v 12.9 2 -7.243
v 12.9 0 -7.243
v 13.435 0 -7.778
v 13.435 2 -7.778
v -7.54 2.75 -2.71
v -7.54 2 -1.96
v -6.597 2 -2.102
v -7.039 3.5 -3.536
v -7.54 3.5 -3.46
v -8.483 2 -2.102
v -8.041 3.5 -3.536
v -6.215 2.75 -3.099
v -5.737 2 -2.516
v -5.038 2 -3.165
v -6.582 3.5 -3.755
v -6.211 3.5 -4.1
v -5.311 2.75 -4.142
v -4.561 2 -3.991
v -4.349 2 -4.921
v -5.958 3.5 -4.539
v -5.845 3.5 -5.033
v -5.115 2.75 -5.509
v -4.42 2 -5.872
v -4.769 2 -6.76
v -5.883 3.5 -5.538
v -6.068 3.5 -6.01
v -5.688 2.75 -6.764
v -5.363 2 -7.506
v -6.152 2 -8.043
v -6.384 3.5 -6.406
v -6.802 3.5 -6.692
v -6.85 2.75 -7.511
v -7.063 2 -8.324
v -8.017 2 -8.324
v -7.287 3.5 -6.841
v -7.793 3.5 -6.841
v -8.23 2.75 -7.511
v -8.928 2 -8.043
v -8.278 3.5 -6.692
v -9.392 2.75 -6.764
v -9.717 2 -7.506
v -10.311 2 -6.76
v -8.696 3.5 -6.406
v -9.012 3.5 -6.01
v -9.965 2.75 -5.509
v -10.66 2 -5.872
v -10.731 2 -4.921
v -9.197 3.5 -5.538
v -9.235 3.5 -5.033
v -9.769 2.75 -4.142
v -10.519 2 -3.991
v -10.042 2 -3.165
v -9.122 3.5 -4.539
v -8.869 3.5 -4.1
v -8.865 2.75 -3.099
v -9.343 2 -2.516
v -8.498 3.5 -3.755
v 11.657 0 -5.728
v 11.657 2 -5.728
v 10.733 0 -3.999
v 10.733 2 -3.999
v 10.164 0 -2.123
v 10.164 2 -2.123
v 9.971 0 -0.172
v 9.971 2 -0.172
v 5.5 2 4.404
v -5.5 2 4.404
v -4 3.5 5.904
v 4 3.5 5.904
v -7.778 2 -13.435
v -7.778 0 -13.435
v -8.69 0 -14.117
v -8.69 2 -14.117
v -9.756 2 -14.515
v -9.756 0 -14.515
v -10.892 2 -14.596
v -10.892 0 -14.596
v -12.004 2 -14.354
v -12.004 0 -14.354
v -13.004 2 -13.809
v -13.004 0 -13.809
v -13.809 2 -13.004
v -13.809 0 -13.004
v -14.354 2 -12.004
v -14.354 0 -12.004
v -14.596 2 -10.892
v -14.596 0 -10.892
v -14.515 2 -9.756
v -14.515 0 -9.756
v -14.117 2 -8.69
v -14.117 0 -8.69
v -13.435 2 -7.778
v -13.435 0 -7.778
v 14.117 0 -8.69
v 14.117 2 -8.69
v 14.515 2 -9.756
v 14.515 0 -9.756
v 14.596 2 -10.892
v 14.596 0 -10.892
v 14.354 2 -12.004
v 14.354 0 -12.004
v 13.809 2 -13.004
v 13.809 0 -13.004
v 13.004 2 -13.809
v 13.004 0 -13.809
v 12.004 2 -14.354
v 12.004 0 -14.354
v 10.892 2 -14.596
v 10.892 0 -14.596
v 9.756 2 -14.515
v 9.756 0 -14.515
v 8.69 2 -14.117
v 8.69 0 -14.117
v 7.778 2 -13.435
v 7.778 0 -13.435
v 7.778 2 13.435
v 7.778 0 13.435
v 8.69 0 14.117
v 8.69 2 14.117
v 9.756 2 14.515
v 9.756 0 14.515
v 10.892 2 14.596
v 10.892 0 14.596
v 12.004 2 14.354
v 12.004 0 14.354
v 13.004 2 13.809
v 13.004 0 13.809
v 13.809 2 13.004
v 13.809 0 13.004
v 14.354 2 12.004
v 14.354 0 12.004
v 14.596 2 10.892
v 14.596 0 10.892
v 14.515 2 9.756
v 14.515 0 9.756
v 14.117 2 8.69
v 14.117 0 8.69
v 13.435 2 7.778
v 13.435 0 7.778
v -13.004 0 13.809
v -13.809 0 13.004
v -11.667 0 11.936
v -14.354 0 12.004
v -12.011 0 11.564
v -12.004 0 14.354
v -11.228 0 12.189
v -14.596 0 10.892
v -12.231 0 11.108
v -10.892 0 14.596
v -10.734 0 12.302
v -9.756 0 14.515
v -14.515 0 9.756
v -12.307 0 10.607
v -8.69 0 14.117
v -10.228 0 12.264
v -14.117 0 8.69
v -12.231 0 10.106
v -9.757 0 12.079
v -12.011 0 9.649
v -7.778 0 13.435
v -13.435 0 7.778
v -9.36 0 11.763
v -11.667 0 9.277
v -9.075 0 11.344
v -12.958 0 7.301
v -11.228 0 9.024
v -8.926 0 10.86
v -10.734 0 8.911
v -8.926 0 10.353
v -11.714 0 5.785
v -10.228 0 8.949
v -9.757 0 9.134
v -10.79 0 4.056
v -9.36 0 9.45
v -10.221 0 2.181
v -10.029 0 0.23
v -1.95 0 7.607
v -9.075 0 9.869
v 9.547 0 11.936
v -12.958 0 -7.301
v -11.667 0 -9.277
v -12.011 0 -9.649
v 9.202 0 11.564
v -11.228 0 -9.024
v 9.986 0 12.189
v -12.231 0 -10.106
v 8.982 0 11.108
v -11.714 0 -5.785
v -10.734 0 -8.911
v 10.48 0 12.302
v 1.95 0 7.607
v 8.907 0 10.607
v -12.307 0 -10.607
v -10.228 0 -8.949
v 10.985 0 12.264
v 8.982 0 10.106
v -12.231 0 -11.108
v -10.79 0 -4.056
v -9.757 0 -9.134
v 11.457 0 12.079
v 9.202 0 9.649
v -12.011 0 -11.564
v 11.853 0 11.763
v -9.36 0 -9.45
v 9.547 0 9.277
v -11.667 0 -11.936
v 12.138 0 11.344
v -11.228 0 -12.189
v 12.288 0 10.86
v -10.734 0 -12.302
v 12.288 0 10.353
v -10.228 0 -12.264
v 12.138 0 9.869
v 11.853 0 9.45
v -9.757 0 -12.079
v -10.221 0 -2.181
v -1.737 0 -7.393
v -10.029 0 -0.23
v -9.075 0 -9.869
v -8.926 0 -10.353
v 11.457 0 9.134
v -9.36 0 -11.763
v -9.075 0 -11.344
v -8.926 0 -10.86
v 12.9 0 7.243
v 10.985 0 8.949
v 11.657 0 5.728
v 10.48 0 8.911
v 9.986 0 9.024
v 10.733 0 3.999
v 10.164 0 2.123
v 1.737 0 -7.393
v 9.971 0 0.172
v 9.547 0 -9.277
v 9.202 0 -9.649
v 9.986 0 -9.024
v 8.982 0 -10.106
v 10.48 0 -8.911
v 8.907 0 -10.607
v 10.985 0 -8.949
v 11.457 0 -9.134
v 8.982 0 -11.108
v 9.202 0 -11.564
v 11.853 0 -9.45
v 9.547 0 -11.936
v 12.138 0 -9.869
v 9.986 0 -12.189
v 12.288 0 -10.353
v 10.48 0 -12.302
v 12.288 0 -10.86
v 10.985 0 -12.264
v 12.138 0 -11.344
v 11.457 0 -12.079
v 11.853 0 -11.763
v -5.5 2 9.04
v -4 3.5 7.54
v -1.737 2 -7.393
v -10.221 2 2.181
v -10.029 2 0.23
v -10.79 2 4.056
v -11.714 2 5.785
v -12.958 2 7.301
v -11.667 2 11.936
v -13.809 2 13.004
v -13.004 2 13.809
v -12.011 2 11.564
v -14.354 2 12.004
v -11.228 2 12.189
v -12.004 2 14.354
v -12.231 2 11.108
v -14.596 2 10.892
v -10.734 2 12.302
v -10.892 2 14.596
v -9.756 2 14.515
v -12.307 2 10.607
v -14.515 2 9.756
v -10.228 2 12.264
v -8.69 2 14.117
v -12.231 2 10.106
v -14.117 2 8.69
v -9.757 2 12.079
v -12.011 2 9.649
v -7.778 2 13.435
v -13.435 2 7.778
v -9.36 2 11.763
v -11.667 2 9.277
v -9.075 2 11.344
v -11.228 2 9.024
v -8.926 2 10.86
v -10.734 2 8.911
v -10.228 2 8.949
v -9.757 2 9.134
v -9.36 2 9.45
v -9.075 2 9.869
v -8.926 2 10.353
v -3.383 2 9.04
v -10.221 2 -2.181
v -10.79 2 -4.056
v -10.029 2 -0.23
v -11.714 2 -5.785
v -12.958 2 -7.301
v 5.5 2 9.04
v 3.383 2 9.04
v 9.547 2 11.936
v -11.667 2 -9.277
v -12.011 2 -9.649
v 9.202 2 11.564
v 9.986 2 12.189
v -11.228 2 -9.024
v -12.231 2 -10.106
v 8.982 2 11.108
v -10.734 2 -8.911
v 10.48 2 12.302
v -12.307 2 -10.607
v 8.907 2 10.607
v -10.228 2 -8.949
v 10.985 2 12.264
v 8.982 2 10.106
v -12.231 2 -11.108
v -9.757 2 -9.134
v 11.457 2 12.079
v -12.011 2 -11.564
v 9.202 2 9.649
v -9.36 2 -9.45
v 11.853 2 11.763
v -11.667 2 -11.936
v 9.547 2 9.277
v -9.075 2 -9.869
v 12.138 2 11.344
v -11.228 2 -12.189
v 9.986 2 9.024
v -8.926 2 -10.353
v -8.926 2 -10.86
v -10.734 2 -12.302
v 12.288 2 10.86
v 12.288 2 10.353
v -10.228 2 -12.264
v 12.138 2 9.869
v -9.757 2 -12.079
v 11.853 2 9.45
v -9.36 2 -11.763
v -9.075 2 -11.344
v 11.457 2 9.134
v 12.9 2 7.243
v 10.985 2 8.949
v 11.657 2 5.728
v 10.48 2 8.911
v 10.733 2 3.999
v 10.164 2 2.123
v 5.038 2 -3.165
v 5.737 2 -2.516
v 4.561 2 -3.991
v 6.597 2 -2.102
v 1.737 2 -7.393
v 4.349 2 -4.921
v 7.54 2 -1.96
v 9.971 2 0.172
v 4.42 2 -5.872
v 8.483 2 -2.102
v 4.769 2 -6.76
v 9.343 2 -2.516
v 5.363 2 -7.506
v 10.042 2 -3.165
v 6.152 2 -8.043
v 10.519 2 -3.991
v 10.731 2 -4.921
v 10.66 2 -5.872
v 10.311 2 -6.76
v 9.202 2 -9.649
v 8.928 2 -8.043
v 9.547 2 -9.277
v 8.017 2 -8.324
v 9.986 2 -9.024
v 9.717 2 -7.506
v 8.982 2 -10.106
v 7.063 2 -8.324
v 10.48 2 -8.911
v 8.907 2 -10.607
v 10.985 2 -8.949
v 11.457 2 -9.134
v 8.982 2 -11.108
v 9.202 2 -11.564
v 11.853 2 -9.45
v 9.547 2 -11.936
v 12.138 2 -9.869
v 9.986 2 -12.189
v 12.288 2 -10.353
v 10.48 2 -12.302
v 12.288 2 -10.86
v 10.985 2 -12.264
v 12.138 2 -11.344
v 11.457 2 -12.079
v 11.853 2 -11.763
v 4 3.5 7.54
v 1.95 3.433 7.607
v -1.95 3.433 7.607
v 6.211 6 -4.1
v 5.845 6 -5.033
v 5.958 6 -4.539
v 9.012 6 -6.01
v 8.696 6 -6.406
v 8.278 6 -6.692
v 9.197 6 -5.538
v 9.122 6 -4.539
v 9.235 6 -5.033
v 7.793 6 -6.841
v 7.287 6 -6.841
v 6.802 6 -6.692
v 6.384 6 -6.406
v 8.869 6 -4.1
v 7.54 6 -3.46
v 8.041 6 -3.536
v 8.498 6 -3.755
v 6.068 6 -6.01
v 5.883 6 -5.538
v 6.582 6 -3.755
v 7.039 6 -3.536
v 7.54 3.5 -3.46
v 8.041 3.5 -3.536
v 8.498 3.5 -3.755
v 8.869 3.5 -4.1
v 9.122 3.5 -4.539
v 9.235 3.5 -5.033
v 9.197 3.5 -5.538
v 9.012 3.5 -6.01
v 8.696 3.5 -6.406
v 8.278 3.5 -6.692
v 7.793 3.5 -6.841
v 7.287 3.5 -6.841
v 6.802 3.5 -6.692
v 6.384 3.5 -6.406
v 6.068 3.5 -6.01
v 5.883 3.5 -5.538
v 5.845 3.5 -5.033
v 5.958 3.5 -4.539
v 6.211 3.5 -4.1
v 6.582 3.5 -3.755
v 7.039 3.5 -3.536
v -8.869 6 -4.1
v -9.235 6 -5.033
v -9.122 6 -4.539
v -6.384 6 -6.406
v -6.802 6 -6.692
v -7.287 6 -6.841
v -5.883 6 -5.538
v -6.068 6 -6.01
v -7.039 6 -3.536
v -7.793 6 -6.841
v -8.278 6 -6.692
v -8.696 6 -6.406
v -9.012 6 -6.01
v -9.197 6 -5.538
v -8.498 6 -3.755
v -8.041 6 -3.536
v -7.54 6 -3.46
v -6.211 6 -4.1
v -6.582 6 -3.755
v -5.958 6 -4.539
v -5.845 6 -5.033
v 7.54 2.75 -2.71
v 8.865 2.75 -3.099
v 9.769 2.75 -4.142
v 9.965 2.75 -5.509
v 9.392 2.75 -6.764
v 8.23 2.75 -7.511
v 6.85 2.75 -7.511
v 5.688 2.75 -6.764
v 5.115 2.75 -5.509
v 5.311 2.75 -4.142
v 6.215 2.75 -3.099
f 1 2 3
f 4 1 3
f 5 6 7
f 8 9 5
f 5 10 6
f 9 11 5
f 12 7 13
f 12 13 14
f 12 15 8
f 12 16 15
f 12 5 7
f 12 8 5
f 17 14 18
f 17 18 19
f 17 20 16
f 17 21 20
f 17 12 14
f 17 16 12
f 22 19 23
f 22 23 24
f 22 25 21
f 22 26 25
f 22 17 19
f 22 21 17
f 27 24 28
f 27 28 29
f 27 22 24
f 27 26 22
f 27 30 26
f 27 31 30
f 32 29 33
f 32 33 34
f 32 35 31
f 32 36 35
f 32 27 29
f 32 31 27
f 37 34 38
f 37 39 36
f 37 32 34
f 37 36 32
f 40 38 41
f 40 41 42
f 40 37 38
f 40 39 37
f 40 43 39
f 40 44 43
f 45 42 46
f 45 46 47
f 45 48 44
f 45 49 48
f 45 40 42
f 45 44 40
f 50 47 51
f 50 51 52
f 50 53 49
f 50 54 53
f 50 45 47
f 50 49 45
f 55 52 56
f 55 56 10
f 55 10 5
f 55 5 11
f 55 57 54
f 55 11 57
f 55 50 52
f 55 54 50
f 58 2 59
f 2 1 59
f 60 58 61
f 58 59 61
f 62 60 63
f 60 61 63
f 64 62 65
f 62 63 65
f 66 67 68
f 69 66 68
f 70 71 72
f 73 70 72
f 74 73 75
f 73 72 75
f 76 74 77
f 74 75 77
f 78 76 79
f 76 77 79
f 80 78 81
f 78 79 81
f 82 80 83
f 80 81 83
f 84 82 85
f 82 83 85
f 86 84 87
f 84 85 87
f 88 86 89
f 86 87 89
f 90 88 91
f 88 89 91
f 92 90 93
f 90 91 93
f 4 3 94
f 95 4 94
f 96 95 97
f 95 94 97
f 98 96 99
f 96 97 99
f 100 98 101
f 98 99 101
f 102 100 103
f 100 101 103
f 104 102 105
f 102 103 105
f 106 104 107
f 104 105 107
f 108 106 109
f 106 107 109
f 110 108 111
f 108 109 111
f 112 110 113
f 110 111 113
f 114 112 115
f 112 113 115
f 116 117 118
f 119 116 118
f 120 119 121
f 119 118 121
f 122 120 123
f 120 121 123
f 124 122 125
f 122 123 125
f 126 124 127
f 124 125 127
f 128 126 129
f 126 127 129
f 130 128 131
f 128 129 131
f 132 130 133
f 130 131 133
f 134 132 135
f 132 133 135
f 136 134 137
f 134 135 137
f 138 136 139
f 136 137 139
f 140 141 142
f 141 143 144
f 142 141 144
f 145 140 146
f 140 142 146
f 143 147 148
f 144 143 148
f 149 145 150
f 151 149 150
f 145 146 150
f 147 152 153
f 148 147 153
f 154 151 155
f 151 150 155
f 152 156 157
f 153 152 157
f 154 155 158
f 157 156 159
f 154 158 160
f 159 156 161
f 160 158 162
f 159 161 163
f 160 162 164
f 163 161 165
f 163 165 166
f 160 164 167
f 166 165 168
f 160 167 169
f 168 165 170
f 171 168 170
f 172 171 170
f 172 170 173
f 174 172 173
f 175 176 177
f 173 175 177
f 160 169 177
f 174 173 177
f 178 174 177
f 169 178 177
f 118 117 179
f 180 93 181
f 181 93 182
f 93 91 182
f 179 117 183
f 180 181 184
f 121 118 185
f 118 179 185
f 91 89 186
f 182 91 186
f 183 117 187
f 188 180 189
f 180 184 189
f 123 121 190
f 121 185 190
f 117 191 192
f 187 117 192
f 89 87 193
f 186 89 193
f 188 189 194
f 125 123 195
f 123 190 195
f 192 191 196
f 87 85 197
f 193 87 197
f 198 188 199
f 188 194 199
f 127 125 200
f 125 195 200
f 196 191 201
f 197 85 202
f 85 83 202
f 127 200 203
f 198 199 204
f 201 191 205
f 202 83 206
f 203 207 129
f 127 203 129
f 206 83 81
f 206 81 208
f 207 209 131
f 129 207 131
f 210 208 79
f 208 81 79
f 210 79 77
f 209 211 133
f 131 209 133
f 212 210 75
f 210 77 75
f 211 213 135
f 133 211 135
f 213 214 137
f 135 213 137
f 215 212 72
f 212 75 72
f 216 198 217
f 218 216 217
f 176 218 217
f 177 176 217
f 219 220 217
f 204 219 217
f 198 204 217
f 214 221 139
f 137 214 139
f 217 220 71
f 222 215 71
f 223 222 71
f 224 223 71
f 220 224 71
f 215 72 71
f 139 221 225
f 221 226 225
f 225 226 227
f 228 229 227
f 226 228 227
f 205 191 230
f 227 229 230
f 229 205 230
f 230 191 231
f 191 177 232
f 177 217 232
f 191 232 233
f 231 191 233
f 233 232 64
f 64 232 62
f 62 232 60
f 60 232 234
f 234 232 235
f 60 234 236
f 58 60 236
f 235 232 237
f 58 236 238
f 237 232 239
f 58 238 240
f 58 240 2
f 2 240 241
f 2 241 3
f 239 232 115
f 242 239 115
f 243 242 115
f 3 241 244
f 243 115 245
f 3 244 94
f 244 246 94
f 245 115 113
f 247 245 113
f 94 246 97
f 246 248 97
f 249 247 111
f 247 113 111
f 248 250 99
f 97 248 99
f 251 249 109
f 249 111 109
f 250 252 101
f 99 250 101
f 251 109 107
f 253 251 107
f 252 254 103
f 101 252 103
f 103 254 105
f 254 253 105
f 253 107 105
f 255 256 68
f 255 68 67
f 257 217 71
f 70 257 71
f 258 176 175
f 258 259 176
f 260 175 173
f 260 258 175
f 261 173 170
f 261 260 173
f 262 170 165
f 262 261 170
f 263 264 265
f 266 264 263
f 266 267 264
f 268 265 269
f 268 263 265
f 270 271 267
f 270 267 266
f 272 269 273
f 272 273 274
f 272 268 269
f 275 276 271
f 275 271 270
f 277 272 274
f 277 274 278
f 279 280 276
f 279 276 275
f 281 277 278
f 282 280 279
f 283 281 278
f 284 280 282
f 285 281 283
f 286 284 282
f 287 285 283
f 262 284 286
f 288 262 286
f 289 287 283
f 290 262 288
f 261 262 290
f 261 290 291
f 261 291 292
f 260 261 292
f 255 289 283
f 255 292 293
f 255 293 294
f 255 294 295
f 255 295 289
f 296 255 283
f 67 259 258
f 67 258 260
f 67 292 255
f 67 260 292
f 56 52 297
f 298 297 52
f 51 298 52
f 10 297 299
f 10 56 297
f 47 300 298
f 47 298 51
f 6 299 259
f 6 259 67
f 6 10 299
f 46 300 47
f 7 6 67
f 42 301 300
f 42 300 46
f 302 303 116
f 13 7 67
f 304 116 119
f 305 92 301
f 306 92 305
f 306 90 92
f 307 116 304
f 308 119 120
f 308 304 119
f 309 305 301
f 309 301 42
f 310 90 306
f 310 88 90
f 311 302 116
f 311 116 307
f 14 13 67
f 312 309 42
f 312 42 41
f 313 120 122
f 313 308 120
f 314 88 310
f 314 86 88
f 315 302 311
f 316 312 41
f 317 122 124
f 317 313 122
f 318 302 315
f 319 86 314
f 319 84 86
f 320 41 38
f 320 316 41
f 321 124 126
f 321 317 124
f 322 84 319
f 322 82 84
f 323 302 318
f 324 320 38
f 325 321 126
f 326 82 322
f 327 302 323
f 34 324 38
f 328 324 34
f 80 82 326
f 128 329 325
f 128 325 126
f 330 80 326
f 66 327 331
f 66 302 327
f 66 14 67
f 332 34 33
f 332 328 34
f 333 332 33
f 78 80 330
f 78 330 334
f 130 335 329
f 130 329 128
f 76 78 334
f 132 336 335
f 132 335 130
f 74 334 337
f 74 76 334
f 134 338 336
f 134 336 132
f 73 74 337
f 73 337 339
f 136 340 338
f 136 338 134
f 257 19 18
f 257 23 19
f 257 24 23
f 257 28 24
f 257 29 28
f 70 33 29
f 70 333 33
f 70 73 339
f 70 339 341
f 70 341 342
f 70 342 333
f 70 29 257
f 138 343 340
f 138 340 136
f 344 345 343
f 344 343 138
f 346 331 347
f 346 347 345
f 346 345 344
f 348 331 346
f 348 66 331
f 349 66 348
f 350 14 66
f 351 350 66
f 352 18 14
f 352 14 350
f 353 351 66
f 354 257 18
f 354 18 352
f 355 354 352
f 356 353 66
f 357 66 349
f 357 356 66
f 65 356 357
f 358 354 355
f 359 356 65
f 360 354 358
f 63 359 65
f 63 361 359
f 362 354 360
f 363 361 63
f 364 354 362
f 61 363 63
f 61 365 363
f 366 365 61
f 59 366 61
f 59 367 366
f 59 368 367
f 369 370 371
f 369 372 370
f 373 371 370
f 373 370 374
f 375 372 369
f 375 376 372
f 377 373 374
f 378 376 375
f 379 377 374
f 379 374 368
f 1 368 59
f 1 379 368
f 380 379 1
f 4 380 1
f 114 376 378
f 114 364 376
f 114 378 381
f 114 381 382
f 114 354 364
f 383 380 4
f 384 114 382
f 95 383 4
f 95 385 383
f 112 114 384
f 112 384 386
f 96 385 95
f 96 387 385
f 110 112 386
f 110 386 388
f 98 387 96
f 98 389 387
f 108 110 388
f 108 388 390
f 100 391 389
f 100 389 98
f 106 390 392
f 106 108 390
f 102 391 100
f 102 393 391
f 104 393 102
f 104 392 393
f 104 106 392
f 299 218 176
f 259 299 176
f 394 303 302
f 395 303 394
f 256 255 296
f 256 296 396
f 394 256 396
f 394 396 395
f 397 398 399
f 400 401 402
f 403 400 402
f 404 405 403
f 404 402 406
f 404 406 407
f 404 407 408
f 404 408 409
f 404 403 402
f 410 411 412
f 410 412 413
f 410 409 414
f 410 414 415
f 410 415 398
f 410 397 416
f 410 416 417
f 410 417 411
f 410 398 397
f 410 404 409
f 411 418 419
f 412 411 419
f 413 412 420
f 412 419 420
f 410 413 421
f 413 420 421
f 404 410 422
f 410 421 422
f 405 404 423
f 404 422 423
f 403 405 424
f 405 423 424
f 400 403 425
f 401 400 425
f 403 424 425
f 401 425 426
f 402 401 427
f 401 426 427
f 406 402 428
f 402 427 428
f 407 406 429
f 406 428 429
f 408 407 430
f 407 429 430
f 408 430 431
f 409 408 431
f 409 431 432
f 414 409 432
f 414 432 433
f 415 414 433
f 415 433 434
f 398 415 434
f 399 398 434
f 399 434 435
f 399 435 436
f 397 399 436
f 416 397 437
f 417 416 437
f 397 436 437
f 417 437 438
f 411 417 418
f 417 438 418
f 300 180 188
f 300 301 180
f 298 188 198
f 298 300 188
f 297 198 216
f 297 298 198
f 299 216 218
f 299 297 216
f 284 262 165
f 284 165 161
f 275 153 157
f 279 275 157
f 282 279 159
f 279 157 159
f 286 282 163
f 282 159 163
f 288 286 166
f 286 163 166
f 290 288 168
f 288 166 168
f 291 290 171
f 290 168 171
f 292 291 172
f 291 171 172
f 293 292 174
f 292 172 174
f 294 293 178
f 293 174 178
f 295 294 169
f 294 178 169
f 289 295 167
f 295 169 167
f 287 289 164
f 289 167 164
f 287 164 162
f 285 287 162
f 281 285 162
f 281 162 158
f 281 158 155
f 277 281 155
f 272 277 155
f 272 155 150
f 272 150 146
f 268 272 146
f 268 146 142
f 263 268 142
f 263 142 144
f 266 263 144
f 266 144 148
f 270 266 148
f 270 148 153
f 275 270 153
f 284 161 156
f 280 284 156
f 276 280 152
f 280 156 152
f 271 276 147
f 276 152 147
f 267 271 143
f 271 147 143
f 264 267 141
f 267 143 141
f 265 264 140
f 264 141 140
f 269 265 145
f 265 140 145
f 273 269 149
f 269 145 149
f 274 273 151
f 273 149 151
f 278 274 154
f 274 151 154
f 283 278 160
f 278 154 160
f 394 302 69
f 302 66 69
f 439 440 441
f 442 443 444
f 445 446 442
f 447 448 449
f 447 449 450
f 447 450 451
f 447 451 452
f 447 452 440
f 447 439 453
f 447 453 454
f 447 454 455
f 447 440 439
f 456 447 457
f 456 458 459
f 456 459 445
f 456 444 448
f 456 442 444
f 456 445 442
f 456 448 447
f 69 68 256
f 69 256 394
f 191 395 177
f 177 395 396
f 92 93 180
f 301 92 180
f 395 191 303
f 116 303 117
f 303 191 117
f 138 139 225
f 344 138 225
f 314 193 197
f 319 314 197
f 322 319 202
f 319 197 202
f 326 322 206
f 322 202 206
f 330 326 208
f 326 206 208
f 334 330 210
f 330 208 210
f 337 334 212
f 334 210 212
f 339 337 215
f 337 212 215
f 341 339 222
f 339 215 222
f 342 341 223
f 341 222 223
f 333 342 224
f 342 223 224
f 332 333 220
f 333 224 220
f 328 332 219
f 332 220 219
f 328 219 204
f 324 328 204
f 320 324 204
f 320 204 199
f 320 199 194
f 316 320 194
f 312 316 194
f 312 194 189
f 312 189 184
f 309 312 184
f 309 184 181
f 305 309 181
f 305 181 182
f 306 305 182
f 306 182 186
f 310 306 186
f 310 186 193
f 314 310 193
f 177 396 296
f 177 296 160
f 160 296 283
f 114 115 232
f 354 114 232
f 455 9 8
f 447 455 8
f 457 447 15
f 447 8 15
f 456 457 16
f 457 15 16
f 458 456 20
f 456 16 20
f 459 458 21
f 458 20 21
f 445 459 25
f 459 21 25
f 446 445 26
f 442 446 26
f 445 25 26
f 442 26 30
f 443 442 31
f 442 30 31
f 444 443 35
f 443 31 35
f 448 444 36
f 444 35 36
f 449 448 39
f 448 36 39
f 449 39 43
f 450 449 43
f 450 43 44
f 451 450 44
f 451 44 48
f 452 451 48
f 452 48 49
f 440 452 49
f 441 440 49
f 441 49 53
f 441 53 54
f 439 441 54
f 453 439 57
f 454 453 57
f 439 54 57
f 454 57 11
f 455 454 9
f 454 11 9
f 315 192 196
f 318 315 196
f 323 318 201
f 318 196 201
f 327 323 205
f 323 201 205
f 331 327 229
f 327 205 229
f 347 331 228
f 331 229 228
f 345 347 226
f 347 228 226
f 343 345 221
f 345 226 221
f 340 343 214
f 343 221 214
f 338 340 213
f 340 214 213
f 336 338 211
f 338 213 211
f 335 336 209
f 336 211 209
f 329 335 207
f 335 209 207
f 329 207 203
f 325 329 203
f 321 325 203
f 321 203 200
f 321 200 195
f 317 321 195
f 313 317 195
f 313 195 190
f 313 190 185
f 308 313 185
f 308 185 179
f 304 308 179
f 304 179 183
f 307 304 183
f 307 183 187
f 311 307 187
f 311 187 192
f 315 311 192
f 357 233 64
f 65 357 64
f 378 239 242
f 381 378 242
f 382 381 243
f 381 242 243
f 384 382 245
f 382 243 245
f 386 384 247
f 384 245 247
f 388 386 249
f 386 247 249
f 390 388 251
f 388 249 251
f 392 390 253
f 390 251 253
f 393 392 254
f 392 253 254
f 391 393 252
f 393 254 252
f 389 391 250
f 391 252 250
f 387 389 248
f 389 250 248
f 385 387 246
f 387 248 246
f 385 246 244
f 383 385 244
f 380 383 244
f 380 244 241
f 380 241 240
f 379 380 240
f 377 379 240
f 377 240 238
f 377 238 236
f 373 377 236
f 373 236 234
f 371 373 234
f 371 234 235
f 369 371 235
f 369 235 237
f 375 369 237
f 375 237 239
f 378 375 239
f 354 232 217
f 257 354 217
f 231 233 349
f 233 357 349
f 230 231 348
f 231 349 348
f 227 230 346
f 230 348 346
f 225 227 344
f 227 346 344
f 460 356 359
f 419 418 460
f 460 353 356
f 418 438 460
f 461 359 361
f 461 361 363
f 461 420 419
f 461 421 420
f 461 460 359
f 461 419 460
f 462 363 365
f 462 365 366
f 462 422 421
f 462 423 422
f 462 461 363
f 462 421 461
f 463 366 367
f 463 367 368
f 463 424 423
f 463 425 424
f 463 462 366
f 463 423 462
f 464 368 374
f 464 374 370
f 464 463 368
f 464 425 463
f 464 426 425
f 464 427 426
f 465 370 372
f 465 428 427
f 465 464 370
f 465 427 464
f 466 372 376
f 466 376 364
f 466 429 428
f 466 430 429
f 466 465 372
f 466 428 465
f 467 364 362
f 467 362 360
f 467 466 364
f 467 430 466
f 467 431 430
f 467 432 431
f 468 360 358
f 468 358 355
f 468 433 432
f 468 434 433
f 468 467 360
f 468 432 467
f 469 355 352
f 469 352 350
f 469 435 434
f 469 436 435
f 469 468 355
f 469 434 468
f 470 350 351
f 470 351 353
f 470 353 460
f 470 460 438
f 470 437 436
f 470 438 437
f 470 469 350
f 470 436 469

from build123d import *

# Parameters (mm, degrees)
BOSS_EXTRUDE1_DEPTH  = 2
M3_CLEARANCE_HOLE1_D = 3.4
SKETCH5_R            = 1.7
BOSS_EXTRUDE2_DEPTH  = 4
FILLET1_R            = 10
BOSS_EXTRUDE3_DEPTH  = 1.5
CHAMFER1_SIZE        = 1.5
CHAMFER2_SIZE        = 1.5


with BuildPart() as part:
    # Sketch2 → Boss-Extrude1 (new body)
    with BuildSketch(Plane(origin=(0, 0, 0), x_dir=(1, 0, 0), z_dir=(0, 1, 0))):
        with BuildLine():
            Line((-13.435028843, 7.778174593), (-10.02863265, 4.371778401))
            Line((-10.02863265, 4.371778401), (-10.02863265, -4.371778401))
            Line((-10.02863265, -4.371778401), (-13.435028843, -7.778174593))
            ThreePointArc((-13.435028843, -7.778174593), (-13.435028843, -13.435028843), (-7.778174593, -13.435028843))
            Line((-7.778174593, -13.435028843), (-1.949747468, -7.606601718))
            Line((-1.949747468, -7.606601718), (1.949747468, -7.606601718))
            Line((1.949747468, -7.606601718), (7.778174593, -13.435028843))
            ThreePointArc((7.778174593, -13.435028843), (13.435028843, -13.435028843), (13.435028843, -7.778174593))
            Line((13.435028843, -7.778174593), (9.97136735, -4.3145131))
            Line((9.97136735, -4.3145131), (9.97136735, 4.3145131))
            Line((9.97136735, 4.3145131), (13.435028843, 7.778174593))
            ThreePointArc((13.435028843, 7.778174593), (13.435028843, 13.435028843), (7.778174593, 13.435028843))
            Line((7.778174593, 13.435028843), (1.736544033, 7.393398282))
            Line((1.736544033, 7.393398282), (-1.736544033, 7.393398282))
            Line((-1.736544033, 7.393398282), (-7.778174593, 13.435028843))
            ThreePointArc((-7.778174593, 13.435028843), (-13.435028843, 13.435028843), (-13.435028843, 7.778174593))
        make_face()
    extrude(amount=BOSS_EXTRUDE1_DEPTH)

    # M3 Clearance Hole1 (through all)
    with Locations(Plane(origin=(0, 2, 0), x_dir=(1, 0, 0), z_dir=(0, 1, 0))):
        with Locations((-10.606601718, -10.606601718), (10.606601718, -10.606601718), (10.606601718, 10.606601718), (-10.606601718, 10.606601718)):
            Hole(M3_CLEARANCE_HOLE1_D / 2)

    # Sketch5 → Boss-Extrude2 (add)
    with BuildSketch(Plane(origin=(0, 2, 0), x_dir=(1, 0, 0), z_dir=(0, 1, 0))):
        with Locations(Location((-7.54, 5.16, 0), (0, 0, 270))):
            Circle(SKETCH5_R)
        with Locations(Location((7.54, 5.16, 0), (0, 0, 270))):
            Circle(SKETCH5_R)
    extrude(amount=BOSS_EXTRUDE2_DEPTH)

    # Fillet1
    fillet1_edges = [part.edges().sort_by_distance(p)[0] for p in [
        (-10.02863265, 1, -4.371778401),
        (-10.02863265, 1, 4.371778401),
        (9.97136735, 1, 4.3145131),
        (9.97136735, 1, -4.3145131),
    ]]
    fillet(fillet1_edges, radius=FILLET1_R)

    # Sketch5<3> → Boss-Extrude3 (add)
    with BuildSketch(Plane(origin=(0, 2, 0), x_dir=(1, 0, 0), z_dir=(0, 1, 0))):
        Polygon((-4, -5.90406477), (-4, -7.54), (0, -7.54), (4, -7.54), (4, -5.90406477), align=None)
    extrude(amount=BOSS_EXTRUDE3_DEPTH)

    # Chamfer1
    chamfer1_edges = [part.edges().sort_by_distance(p)[0] for p in [
        (7.54, 2, -6.86),
        (-7.54, 2, -6.86),
    ]]
    chamfer(chamfer1_edges, length=CHAMFER1_SIZE)

    # Chamfer2
    # the kernel refuses this chamfer: 1.5 mm, written as the material it adds along each edge
    with BuildSketch(Plane(origin=(7.857524482, 2, 5.90406477), x_dir=(0, 0, -1), z_dir=(-1, 0, 0))) as chamfer2_piece_1_section:
        Polygon((CHAMFER2_SIZE, 0), (0, -CHAMFER2_SIZE), (0, 0), align=None)
    chamfer2_piece_1 = extrude(amount=15.715048964, mode=Mode.PRIVATE)
    chamfer2_piece_1 = split(chamfer2_piece_1, bisect_by=Plane(origin=(1.178762241, 8.678762241, 5.90406477), z_dir=(0.7071067811865476, -0.7071067811865476, 0)), keep=Keep.TOP, mode=Mode.PRIVATE)
    chamfer2_piece_1 = split(chamfer2_piece_1, bisect_by=Plane(origin=(6.678762241, 0.821237759, 5.90406477), z_dir=(-0.7071067811865476, -0.7071067811865476, 0)), keep=Keep.TOP, mode=Mode.PRIVATE)
    add(chamfer2_piece_1)
    with BuildSketch(Plane(origin=(-4, 2, 2.046540288), x_dir=(-1, 0, 0), z_dir=(0, 0, 1))) as chamfer2_piece_2_section:
        Polygon((CHAMFER2_SIZE, 0), (0, -CHAMFER2_SIZE), (0, 0), align=None)
    chamfer2_piece_2 = extrude(amount=9.350984194, mode=Mode.PRIVATE)
    chamfer2_piece_2 = split(chamfer2_piece_2, bisect_by=Plane(origin=(-4, 5.496729856, 5.543270144), z_dir=(0, -0.7071067811865474, -0.7071067811865477)), keep=Keep.TOP, mode=Mode.PRIVATE)
    chamfer2_piece_2 = split(chamfer2_piece_2, bisect_by=Plane(origin=(-4, 0.821237759, 3.225302529), z_dir=(0, -0.7071067811865476, 0.7071067811865476)), keep=Keep.TOP, mode=Mode.PRIVATE)
    add(chamfer2_piece_2)
    with BuildSketch(Plane(origin=(-7.857524482, 2, 7.54), x_dir=(0, 0, 1), z_dir=(1, 0, 0))) as chamfer2_piece_3_section:
        Polygon((CHAMFER2_SIZE, 0), (0, -CHAMFER2_SIZE), (0, 0), align=None)
    chamfer2_piece_3 = extrude(amount=15.715048964, mode=Mode.PRIVATE)
    chamfer2_piece_3 = split(chamfer2_piece_3, bisect_by=Plane(origin=(-4.870335116, 2, 10.527189366), z_dir=(-0.7071067811865475, 0, -0.7071067811865476)), keep=Keep.TOP, mode=Mode.PRIVATE)
    chamfer2_piece_3 = split(chamfer2_piece_3, bisect_by=Plane(origin=(-6.678762241, 0.821237759, 7.54), z_dir=(0.7071067811865476, -0.7071067811865476, 0)), keep=Keep.TOP, mode=Mode.PRIVATE)
    add(chamfer2_piece_3)
    with BuildSketch(Plane(origin=(-7.857524482, 2, 7.54), x_dir=(0, 0, 1), z_dir=(1, 0, 0))) as chamfer2_piece_4_section:
        Polygon((CHAMFER2_SIZE, 0), (0, -CHAMFER2_SIZE), (0, 0), align=None)
    chamfer2_piece_4 = extrude(amount=15.715048964, mode=Mode.PRIVATE)
    chamfer2_piece_4 = split(chamfer2_piece_4, bisect_by=Plane(origin=(-7.857524482, 2, 7.606601718), z_dir=(0, 0, -1)), keep=Keep.TOP, mode=Mode.PRIVATE)
    chamfer2_piece_4 = split(chamfer2_piece_4, bisect_by=Plane(origin=(-6.678762241, 0.821237759, 7.54), z_dir=(0.7071067811865476, -0.7071067811865476, 0)), keep=Keep.TOP, mode=Mode.PRIVATE)
    chamfer2_piece_4 = split(chamfer2_piece_4, bisect_by=Plane(origin=(-1.178762241, 8.678762241, 7.54), z_dir=(-0.7071067811865476, -0.7071067811865476, 0)), keep=Keep.TOP, mode=Mode.PRIVATE)
    add(chamfer2_piece_4)
    with BuildSketch(Plane(origin=(-7.857524482, 2, 7.54), x_dir=(0, 0, 1), z_dir=(1, 0, 0))) as chamfer2_piece_5_section:
        Polygon((CHAMFER2_SIZE, 0), (0, -CHAMFER2_SIZE), (0, 0), align=None)
    chamfer2_piece_5 = extrude(amount=15.715048964, mode=Mode.PRIVATE)
    chamfer2_piece_5 = split(chamfer2_piece_5, bisect_by=Plane(origin=(-2.987189366, 2, 2.669664884), z_dir=(0.7071067811865515, 0, -0.7071067811865437)), keep=Keep.TOP, mode=Mode.PRIVATE)
    chamfer2_piece_5 = split(chamfer2_piece_5, bisect_by=Plane(origin=(-1.178762241, 8.678762241, 7.54), z_dir=(-0.7071067811865476, -0.7071067811865476, 0)), keep=Keep.TOP, mode=Mode.PRIVATE)
    add(chamfer2_piece_5)
    with BuildSketch(Plane(origin=(4, 2, 11.397524482), x_dir=(1, 0, 0), z_dir=(0, 0, -1))) as chamfer2_piece_6_section:
        Polygon((CHAMFER2_SIZE, 0), (0, -CHAMFER2_SIZE), (0, 0), align=None)
    chamfer2_piece_6 = extrude(amount=9.350984194, mode=Mode.PRIVATE)
    chamfer2_piece_6 = split(chamfer2_piece_6, bisect_by=Plane(origin=(4, 0.821237759, 10.218762241), z_dir=(0, -0.7071067811865474, -0.7071067811865477)), keep=Keep.TOP, mode=Mode.PRIVATE)
    chamfer2_piece_6 = split(chamfer2_piece_6, bisect_by=Plane(origin=(4, 5.496729856, 7.900794626), z_dir=(0, -0.7071067811865476, 0.7071067811865476)), keep=Keep.TOP, mode=Mode.PRIVATE)
    add(chamfer2_piece_6)


solid = part.part
